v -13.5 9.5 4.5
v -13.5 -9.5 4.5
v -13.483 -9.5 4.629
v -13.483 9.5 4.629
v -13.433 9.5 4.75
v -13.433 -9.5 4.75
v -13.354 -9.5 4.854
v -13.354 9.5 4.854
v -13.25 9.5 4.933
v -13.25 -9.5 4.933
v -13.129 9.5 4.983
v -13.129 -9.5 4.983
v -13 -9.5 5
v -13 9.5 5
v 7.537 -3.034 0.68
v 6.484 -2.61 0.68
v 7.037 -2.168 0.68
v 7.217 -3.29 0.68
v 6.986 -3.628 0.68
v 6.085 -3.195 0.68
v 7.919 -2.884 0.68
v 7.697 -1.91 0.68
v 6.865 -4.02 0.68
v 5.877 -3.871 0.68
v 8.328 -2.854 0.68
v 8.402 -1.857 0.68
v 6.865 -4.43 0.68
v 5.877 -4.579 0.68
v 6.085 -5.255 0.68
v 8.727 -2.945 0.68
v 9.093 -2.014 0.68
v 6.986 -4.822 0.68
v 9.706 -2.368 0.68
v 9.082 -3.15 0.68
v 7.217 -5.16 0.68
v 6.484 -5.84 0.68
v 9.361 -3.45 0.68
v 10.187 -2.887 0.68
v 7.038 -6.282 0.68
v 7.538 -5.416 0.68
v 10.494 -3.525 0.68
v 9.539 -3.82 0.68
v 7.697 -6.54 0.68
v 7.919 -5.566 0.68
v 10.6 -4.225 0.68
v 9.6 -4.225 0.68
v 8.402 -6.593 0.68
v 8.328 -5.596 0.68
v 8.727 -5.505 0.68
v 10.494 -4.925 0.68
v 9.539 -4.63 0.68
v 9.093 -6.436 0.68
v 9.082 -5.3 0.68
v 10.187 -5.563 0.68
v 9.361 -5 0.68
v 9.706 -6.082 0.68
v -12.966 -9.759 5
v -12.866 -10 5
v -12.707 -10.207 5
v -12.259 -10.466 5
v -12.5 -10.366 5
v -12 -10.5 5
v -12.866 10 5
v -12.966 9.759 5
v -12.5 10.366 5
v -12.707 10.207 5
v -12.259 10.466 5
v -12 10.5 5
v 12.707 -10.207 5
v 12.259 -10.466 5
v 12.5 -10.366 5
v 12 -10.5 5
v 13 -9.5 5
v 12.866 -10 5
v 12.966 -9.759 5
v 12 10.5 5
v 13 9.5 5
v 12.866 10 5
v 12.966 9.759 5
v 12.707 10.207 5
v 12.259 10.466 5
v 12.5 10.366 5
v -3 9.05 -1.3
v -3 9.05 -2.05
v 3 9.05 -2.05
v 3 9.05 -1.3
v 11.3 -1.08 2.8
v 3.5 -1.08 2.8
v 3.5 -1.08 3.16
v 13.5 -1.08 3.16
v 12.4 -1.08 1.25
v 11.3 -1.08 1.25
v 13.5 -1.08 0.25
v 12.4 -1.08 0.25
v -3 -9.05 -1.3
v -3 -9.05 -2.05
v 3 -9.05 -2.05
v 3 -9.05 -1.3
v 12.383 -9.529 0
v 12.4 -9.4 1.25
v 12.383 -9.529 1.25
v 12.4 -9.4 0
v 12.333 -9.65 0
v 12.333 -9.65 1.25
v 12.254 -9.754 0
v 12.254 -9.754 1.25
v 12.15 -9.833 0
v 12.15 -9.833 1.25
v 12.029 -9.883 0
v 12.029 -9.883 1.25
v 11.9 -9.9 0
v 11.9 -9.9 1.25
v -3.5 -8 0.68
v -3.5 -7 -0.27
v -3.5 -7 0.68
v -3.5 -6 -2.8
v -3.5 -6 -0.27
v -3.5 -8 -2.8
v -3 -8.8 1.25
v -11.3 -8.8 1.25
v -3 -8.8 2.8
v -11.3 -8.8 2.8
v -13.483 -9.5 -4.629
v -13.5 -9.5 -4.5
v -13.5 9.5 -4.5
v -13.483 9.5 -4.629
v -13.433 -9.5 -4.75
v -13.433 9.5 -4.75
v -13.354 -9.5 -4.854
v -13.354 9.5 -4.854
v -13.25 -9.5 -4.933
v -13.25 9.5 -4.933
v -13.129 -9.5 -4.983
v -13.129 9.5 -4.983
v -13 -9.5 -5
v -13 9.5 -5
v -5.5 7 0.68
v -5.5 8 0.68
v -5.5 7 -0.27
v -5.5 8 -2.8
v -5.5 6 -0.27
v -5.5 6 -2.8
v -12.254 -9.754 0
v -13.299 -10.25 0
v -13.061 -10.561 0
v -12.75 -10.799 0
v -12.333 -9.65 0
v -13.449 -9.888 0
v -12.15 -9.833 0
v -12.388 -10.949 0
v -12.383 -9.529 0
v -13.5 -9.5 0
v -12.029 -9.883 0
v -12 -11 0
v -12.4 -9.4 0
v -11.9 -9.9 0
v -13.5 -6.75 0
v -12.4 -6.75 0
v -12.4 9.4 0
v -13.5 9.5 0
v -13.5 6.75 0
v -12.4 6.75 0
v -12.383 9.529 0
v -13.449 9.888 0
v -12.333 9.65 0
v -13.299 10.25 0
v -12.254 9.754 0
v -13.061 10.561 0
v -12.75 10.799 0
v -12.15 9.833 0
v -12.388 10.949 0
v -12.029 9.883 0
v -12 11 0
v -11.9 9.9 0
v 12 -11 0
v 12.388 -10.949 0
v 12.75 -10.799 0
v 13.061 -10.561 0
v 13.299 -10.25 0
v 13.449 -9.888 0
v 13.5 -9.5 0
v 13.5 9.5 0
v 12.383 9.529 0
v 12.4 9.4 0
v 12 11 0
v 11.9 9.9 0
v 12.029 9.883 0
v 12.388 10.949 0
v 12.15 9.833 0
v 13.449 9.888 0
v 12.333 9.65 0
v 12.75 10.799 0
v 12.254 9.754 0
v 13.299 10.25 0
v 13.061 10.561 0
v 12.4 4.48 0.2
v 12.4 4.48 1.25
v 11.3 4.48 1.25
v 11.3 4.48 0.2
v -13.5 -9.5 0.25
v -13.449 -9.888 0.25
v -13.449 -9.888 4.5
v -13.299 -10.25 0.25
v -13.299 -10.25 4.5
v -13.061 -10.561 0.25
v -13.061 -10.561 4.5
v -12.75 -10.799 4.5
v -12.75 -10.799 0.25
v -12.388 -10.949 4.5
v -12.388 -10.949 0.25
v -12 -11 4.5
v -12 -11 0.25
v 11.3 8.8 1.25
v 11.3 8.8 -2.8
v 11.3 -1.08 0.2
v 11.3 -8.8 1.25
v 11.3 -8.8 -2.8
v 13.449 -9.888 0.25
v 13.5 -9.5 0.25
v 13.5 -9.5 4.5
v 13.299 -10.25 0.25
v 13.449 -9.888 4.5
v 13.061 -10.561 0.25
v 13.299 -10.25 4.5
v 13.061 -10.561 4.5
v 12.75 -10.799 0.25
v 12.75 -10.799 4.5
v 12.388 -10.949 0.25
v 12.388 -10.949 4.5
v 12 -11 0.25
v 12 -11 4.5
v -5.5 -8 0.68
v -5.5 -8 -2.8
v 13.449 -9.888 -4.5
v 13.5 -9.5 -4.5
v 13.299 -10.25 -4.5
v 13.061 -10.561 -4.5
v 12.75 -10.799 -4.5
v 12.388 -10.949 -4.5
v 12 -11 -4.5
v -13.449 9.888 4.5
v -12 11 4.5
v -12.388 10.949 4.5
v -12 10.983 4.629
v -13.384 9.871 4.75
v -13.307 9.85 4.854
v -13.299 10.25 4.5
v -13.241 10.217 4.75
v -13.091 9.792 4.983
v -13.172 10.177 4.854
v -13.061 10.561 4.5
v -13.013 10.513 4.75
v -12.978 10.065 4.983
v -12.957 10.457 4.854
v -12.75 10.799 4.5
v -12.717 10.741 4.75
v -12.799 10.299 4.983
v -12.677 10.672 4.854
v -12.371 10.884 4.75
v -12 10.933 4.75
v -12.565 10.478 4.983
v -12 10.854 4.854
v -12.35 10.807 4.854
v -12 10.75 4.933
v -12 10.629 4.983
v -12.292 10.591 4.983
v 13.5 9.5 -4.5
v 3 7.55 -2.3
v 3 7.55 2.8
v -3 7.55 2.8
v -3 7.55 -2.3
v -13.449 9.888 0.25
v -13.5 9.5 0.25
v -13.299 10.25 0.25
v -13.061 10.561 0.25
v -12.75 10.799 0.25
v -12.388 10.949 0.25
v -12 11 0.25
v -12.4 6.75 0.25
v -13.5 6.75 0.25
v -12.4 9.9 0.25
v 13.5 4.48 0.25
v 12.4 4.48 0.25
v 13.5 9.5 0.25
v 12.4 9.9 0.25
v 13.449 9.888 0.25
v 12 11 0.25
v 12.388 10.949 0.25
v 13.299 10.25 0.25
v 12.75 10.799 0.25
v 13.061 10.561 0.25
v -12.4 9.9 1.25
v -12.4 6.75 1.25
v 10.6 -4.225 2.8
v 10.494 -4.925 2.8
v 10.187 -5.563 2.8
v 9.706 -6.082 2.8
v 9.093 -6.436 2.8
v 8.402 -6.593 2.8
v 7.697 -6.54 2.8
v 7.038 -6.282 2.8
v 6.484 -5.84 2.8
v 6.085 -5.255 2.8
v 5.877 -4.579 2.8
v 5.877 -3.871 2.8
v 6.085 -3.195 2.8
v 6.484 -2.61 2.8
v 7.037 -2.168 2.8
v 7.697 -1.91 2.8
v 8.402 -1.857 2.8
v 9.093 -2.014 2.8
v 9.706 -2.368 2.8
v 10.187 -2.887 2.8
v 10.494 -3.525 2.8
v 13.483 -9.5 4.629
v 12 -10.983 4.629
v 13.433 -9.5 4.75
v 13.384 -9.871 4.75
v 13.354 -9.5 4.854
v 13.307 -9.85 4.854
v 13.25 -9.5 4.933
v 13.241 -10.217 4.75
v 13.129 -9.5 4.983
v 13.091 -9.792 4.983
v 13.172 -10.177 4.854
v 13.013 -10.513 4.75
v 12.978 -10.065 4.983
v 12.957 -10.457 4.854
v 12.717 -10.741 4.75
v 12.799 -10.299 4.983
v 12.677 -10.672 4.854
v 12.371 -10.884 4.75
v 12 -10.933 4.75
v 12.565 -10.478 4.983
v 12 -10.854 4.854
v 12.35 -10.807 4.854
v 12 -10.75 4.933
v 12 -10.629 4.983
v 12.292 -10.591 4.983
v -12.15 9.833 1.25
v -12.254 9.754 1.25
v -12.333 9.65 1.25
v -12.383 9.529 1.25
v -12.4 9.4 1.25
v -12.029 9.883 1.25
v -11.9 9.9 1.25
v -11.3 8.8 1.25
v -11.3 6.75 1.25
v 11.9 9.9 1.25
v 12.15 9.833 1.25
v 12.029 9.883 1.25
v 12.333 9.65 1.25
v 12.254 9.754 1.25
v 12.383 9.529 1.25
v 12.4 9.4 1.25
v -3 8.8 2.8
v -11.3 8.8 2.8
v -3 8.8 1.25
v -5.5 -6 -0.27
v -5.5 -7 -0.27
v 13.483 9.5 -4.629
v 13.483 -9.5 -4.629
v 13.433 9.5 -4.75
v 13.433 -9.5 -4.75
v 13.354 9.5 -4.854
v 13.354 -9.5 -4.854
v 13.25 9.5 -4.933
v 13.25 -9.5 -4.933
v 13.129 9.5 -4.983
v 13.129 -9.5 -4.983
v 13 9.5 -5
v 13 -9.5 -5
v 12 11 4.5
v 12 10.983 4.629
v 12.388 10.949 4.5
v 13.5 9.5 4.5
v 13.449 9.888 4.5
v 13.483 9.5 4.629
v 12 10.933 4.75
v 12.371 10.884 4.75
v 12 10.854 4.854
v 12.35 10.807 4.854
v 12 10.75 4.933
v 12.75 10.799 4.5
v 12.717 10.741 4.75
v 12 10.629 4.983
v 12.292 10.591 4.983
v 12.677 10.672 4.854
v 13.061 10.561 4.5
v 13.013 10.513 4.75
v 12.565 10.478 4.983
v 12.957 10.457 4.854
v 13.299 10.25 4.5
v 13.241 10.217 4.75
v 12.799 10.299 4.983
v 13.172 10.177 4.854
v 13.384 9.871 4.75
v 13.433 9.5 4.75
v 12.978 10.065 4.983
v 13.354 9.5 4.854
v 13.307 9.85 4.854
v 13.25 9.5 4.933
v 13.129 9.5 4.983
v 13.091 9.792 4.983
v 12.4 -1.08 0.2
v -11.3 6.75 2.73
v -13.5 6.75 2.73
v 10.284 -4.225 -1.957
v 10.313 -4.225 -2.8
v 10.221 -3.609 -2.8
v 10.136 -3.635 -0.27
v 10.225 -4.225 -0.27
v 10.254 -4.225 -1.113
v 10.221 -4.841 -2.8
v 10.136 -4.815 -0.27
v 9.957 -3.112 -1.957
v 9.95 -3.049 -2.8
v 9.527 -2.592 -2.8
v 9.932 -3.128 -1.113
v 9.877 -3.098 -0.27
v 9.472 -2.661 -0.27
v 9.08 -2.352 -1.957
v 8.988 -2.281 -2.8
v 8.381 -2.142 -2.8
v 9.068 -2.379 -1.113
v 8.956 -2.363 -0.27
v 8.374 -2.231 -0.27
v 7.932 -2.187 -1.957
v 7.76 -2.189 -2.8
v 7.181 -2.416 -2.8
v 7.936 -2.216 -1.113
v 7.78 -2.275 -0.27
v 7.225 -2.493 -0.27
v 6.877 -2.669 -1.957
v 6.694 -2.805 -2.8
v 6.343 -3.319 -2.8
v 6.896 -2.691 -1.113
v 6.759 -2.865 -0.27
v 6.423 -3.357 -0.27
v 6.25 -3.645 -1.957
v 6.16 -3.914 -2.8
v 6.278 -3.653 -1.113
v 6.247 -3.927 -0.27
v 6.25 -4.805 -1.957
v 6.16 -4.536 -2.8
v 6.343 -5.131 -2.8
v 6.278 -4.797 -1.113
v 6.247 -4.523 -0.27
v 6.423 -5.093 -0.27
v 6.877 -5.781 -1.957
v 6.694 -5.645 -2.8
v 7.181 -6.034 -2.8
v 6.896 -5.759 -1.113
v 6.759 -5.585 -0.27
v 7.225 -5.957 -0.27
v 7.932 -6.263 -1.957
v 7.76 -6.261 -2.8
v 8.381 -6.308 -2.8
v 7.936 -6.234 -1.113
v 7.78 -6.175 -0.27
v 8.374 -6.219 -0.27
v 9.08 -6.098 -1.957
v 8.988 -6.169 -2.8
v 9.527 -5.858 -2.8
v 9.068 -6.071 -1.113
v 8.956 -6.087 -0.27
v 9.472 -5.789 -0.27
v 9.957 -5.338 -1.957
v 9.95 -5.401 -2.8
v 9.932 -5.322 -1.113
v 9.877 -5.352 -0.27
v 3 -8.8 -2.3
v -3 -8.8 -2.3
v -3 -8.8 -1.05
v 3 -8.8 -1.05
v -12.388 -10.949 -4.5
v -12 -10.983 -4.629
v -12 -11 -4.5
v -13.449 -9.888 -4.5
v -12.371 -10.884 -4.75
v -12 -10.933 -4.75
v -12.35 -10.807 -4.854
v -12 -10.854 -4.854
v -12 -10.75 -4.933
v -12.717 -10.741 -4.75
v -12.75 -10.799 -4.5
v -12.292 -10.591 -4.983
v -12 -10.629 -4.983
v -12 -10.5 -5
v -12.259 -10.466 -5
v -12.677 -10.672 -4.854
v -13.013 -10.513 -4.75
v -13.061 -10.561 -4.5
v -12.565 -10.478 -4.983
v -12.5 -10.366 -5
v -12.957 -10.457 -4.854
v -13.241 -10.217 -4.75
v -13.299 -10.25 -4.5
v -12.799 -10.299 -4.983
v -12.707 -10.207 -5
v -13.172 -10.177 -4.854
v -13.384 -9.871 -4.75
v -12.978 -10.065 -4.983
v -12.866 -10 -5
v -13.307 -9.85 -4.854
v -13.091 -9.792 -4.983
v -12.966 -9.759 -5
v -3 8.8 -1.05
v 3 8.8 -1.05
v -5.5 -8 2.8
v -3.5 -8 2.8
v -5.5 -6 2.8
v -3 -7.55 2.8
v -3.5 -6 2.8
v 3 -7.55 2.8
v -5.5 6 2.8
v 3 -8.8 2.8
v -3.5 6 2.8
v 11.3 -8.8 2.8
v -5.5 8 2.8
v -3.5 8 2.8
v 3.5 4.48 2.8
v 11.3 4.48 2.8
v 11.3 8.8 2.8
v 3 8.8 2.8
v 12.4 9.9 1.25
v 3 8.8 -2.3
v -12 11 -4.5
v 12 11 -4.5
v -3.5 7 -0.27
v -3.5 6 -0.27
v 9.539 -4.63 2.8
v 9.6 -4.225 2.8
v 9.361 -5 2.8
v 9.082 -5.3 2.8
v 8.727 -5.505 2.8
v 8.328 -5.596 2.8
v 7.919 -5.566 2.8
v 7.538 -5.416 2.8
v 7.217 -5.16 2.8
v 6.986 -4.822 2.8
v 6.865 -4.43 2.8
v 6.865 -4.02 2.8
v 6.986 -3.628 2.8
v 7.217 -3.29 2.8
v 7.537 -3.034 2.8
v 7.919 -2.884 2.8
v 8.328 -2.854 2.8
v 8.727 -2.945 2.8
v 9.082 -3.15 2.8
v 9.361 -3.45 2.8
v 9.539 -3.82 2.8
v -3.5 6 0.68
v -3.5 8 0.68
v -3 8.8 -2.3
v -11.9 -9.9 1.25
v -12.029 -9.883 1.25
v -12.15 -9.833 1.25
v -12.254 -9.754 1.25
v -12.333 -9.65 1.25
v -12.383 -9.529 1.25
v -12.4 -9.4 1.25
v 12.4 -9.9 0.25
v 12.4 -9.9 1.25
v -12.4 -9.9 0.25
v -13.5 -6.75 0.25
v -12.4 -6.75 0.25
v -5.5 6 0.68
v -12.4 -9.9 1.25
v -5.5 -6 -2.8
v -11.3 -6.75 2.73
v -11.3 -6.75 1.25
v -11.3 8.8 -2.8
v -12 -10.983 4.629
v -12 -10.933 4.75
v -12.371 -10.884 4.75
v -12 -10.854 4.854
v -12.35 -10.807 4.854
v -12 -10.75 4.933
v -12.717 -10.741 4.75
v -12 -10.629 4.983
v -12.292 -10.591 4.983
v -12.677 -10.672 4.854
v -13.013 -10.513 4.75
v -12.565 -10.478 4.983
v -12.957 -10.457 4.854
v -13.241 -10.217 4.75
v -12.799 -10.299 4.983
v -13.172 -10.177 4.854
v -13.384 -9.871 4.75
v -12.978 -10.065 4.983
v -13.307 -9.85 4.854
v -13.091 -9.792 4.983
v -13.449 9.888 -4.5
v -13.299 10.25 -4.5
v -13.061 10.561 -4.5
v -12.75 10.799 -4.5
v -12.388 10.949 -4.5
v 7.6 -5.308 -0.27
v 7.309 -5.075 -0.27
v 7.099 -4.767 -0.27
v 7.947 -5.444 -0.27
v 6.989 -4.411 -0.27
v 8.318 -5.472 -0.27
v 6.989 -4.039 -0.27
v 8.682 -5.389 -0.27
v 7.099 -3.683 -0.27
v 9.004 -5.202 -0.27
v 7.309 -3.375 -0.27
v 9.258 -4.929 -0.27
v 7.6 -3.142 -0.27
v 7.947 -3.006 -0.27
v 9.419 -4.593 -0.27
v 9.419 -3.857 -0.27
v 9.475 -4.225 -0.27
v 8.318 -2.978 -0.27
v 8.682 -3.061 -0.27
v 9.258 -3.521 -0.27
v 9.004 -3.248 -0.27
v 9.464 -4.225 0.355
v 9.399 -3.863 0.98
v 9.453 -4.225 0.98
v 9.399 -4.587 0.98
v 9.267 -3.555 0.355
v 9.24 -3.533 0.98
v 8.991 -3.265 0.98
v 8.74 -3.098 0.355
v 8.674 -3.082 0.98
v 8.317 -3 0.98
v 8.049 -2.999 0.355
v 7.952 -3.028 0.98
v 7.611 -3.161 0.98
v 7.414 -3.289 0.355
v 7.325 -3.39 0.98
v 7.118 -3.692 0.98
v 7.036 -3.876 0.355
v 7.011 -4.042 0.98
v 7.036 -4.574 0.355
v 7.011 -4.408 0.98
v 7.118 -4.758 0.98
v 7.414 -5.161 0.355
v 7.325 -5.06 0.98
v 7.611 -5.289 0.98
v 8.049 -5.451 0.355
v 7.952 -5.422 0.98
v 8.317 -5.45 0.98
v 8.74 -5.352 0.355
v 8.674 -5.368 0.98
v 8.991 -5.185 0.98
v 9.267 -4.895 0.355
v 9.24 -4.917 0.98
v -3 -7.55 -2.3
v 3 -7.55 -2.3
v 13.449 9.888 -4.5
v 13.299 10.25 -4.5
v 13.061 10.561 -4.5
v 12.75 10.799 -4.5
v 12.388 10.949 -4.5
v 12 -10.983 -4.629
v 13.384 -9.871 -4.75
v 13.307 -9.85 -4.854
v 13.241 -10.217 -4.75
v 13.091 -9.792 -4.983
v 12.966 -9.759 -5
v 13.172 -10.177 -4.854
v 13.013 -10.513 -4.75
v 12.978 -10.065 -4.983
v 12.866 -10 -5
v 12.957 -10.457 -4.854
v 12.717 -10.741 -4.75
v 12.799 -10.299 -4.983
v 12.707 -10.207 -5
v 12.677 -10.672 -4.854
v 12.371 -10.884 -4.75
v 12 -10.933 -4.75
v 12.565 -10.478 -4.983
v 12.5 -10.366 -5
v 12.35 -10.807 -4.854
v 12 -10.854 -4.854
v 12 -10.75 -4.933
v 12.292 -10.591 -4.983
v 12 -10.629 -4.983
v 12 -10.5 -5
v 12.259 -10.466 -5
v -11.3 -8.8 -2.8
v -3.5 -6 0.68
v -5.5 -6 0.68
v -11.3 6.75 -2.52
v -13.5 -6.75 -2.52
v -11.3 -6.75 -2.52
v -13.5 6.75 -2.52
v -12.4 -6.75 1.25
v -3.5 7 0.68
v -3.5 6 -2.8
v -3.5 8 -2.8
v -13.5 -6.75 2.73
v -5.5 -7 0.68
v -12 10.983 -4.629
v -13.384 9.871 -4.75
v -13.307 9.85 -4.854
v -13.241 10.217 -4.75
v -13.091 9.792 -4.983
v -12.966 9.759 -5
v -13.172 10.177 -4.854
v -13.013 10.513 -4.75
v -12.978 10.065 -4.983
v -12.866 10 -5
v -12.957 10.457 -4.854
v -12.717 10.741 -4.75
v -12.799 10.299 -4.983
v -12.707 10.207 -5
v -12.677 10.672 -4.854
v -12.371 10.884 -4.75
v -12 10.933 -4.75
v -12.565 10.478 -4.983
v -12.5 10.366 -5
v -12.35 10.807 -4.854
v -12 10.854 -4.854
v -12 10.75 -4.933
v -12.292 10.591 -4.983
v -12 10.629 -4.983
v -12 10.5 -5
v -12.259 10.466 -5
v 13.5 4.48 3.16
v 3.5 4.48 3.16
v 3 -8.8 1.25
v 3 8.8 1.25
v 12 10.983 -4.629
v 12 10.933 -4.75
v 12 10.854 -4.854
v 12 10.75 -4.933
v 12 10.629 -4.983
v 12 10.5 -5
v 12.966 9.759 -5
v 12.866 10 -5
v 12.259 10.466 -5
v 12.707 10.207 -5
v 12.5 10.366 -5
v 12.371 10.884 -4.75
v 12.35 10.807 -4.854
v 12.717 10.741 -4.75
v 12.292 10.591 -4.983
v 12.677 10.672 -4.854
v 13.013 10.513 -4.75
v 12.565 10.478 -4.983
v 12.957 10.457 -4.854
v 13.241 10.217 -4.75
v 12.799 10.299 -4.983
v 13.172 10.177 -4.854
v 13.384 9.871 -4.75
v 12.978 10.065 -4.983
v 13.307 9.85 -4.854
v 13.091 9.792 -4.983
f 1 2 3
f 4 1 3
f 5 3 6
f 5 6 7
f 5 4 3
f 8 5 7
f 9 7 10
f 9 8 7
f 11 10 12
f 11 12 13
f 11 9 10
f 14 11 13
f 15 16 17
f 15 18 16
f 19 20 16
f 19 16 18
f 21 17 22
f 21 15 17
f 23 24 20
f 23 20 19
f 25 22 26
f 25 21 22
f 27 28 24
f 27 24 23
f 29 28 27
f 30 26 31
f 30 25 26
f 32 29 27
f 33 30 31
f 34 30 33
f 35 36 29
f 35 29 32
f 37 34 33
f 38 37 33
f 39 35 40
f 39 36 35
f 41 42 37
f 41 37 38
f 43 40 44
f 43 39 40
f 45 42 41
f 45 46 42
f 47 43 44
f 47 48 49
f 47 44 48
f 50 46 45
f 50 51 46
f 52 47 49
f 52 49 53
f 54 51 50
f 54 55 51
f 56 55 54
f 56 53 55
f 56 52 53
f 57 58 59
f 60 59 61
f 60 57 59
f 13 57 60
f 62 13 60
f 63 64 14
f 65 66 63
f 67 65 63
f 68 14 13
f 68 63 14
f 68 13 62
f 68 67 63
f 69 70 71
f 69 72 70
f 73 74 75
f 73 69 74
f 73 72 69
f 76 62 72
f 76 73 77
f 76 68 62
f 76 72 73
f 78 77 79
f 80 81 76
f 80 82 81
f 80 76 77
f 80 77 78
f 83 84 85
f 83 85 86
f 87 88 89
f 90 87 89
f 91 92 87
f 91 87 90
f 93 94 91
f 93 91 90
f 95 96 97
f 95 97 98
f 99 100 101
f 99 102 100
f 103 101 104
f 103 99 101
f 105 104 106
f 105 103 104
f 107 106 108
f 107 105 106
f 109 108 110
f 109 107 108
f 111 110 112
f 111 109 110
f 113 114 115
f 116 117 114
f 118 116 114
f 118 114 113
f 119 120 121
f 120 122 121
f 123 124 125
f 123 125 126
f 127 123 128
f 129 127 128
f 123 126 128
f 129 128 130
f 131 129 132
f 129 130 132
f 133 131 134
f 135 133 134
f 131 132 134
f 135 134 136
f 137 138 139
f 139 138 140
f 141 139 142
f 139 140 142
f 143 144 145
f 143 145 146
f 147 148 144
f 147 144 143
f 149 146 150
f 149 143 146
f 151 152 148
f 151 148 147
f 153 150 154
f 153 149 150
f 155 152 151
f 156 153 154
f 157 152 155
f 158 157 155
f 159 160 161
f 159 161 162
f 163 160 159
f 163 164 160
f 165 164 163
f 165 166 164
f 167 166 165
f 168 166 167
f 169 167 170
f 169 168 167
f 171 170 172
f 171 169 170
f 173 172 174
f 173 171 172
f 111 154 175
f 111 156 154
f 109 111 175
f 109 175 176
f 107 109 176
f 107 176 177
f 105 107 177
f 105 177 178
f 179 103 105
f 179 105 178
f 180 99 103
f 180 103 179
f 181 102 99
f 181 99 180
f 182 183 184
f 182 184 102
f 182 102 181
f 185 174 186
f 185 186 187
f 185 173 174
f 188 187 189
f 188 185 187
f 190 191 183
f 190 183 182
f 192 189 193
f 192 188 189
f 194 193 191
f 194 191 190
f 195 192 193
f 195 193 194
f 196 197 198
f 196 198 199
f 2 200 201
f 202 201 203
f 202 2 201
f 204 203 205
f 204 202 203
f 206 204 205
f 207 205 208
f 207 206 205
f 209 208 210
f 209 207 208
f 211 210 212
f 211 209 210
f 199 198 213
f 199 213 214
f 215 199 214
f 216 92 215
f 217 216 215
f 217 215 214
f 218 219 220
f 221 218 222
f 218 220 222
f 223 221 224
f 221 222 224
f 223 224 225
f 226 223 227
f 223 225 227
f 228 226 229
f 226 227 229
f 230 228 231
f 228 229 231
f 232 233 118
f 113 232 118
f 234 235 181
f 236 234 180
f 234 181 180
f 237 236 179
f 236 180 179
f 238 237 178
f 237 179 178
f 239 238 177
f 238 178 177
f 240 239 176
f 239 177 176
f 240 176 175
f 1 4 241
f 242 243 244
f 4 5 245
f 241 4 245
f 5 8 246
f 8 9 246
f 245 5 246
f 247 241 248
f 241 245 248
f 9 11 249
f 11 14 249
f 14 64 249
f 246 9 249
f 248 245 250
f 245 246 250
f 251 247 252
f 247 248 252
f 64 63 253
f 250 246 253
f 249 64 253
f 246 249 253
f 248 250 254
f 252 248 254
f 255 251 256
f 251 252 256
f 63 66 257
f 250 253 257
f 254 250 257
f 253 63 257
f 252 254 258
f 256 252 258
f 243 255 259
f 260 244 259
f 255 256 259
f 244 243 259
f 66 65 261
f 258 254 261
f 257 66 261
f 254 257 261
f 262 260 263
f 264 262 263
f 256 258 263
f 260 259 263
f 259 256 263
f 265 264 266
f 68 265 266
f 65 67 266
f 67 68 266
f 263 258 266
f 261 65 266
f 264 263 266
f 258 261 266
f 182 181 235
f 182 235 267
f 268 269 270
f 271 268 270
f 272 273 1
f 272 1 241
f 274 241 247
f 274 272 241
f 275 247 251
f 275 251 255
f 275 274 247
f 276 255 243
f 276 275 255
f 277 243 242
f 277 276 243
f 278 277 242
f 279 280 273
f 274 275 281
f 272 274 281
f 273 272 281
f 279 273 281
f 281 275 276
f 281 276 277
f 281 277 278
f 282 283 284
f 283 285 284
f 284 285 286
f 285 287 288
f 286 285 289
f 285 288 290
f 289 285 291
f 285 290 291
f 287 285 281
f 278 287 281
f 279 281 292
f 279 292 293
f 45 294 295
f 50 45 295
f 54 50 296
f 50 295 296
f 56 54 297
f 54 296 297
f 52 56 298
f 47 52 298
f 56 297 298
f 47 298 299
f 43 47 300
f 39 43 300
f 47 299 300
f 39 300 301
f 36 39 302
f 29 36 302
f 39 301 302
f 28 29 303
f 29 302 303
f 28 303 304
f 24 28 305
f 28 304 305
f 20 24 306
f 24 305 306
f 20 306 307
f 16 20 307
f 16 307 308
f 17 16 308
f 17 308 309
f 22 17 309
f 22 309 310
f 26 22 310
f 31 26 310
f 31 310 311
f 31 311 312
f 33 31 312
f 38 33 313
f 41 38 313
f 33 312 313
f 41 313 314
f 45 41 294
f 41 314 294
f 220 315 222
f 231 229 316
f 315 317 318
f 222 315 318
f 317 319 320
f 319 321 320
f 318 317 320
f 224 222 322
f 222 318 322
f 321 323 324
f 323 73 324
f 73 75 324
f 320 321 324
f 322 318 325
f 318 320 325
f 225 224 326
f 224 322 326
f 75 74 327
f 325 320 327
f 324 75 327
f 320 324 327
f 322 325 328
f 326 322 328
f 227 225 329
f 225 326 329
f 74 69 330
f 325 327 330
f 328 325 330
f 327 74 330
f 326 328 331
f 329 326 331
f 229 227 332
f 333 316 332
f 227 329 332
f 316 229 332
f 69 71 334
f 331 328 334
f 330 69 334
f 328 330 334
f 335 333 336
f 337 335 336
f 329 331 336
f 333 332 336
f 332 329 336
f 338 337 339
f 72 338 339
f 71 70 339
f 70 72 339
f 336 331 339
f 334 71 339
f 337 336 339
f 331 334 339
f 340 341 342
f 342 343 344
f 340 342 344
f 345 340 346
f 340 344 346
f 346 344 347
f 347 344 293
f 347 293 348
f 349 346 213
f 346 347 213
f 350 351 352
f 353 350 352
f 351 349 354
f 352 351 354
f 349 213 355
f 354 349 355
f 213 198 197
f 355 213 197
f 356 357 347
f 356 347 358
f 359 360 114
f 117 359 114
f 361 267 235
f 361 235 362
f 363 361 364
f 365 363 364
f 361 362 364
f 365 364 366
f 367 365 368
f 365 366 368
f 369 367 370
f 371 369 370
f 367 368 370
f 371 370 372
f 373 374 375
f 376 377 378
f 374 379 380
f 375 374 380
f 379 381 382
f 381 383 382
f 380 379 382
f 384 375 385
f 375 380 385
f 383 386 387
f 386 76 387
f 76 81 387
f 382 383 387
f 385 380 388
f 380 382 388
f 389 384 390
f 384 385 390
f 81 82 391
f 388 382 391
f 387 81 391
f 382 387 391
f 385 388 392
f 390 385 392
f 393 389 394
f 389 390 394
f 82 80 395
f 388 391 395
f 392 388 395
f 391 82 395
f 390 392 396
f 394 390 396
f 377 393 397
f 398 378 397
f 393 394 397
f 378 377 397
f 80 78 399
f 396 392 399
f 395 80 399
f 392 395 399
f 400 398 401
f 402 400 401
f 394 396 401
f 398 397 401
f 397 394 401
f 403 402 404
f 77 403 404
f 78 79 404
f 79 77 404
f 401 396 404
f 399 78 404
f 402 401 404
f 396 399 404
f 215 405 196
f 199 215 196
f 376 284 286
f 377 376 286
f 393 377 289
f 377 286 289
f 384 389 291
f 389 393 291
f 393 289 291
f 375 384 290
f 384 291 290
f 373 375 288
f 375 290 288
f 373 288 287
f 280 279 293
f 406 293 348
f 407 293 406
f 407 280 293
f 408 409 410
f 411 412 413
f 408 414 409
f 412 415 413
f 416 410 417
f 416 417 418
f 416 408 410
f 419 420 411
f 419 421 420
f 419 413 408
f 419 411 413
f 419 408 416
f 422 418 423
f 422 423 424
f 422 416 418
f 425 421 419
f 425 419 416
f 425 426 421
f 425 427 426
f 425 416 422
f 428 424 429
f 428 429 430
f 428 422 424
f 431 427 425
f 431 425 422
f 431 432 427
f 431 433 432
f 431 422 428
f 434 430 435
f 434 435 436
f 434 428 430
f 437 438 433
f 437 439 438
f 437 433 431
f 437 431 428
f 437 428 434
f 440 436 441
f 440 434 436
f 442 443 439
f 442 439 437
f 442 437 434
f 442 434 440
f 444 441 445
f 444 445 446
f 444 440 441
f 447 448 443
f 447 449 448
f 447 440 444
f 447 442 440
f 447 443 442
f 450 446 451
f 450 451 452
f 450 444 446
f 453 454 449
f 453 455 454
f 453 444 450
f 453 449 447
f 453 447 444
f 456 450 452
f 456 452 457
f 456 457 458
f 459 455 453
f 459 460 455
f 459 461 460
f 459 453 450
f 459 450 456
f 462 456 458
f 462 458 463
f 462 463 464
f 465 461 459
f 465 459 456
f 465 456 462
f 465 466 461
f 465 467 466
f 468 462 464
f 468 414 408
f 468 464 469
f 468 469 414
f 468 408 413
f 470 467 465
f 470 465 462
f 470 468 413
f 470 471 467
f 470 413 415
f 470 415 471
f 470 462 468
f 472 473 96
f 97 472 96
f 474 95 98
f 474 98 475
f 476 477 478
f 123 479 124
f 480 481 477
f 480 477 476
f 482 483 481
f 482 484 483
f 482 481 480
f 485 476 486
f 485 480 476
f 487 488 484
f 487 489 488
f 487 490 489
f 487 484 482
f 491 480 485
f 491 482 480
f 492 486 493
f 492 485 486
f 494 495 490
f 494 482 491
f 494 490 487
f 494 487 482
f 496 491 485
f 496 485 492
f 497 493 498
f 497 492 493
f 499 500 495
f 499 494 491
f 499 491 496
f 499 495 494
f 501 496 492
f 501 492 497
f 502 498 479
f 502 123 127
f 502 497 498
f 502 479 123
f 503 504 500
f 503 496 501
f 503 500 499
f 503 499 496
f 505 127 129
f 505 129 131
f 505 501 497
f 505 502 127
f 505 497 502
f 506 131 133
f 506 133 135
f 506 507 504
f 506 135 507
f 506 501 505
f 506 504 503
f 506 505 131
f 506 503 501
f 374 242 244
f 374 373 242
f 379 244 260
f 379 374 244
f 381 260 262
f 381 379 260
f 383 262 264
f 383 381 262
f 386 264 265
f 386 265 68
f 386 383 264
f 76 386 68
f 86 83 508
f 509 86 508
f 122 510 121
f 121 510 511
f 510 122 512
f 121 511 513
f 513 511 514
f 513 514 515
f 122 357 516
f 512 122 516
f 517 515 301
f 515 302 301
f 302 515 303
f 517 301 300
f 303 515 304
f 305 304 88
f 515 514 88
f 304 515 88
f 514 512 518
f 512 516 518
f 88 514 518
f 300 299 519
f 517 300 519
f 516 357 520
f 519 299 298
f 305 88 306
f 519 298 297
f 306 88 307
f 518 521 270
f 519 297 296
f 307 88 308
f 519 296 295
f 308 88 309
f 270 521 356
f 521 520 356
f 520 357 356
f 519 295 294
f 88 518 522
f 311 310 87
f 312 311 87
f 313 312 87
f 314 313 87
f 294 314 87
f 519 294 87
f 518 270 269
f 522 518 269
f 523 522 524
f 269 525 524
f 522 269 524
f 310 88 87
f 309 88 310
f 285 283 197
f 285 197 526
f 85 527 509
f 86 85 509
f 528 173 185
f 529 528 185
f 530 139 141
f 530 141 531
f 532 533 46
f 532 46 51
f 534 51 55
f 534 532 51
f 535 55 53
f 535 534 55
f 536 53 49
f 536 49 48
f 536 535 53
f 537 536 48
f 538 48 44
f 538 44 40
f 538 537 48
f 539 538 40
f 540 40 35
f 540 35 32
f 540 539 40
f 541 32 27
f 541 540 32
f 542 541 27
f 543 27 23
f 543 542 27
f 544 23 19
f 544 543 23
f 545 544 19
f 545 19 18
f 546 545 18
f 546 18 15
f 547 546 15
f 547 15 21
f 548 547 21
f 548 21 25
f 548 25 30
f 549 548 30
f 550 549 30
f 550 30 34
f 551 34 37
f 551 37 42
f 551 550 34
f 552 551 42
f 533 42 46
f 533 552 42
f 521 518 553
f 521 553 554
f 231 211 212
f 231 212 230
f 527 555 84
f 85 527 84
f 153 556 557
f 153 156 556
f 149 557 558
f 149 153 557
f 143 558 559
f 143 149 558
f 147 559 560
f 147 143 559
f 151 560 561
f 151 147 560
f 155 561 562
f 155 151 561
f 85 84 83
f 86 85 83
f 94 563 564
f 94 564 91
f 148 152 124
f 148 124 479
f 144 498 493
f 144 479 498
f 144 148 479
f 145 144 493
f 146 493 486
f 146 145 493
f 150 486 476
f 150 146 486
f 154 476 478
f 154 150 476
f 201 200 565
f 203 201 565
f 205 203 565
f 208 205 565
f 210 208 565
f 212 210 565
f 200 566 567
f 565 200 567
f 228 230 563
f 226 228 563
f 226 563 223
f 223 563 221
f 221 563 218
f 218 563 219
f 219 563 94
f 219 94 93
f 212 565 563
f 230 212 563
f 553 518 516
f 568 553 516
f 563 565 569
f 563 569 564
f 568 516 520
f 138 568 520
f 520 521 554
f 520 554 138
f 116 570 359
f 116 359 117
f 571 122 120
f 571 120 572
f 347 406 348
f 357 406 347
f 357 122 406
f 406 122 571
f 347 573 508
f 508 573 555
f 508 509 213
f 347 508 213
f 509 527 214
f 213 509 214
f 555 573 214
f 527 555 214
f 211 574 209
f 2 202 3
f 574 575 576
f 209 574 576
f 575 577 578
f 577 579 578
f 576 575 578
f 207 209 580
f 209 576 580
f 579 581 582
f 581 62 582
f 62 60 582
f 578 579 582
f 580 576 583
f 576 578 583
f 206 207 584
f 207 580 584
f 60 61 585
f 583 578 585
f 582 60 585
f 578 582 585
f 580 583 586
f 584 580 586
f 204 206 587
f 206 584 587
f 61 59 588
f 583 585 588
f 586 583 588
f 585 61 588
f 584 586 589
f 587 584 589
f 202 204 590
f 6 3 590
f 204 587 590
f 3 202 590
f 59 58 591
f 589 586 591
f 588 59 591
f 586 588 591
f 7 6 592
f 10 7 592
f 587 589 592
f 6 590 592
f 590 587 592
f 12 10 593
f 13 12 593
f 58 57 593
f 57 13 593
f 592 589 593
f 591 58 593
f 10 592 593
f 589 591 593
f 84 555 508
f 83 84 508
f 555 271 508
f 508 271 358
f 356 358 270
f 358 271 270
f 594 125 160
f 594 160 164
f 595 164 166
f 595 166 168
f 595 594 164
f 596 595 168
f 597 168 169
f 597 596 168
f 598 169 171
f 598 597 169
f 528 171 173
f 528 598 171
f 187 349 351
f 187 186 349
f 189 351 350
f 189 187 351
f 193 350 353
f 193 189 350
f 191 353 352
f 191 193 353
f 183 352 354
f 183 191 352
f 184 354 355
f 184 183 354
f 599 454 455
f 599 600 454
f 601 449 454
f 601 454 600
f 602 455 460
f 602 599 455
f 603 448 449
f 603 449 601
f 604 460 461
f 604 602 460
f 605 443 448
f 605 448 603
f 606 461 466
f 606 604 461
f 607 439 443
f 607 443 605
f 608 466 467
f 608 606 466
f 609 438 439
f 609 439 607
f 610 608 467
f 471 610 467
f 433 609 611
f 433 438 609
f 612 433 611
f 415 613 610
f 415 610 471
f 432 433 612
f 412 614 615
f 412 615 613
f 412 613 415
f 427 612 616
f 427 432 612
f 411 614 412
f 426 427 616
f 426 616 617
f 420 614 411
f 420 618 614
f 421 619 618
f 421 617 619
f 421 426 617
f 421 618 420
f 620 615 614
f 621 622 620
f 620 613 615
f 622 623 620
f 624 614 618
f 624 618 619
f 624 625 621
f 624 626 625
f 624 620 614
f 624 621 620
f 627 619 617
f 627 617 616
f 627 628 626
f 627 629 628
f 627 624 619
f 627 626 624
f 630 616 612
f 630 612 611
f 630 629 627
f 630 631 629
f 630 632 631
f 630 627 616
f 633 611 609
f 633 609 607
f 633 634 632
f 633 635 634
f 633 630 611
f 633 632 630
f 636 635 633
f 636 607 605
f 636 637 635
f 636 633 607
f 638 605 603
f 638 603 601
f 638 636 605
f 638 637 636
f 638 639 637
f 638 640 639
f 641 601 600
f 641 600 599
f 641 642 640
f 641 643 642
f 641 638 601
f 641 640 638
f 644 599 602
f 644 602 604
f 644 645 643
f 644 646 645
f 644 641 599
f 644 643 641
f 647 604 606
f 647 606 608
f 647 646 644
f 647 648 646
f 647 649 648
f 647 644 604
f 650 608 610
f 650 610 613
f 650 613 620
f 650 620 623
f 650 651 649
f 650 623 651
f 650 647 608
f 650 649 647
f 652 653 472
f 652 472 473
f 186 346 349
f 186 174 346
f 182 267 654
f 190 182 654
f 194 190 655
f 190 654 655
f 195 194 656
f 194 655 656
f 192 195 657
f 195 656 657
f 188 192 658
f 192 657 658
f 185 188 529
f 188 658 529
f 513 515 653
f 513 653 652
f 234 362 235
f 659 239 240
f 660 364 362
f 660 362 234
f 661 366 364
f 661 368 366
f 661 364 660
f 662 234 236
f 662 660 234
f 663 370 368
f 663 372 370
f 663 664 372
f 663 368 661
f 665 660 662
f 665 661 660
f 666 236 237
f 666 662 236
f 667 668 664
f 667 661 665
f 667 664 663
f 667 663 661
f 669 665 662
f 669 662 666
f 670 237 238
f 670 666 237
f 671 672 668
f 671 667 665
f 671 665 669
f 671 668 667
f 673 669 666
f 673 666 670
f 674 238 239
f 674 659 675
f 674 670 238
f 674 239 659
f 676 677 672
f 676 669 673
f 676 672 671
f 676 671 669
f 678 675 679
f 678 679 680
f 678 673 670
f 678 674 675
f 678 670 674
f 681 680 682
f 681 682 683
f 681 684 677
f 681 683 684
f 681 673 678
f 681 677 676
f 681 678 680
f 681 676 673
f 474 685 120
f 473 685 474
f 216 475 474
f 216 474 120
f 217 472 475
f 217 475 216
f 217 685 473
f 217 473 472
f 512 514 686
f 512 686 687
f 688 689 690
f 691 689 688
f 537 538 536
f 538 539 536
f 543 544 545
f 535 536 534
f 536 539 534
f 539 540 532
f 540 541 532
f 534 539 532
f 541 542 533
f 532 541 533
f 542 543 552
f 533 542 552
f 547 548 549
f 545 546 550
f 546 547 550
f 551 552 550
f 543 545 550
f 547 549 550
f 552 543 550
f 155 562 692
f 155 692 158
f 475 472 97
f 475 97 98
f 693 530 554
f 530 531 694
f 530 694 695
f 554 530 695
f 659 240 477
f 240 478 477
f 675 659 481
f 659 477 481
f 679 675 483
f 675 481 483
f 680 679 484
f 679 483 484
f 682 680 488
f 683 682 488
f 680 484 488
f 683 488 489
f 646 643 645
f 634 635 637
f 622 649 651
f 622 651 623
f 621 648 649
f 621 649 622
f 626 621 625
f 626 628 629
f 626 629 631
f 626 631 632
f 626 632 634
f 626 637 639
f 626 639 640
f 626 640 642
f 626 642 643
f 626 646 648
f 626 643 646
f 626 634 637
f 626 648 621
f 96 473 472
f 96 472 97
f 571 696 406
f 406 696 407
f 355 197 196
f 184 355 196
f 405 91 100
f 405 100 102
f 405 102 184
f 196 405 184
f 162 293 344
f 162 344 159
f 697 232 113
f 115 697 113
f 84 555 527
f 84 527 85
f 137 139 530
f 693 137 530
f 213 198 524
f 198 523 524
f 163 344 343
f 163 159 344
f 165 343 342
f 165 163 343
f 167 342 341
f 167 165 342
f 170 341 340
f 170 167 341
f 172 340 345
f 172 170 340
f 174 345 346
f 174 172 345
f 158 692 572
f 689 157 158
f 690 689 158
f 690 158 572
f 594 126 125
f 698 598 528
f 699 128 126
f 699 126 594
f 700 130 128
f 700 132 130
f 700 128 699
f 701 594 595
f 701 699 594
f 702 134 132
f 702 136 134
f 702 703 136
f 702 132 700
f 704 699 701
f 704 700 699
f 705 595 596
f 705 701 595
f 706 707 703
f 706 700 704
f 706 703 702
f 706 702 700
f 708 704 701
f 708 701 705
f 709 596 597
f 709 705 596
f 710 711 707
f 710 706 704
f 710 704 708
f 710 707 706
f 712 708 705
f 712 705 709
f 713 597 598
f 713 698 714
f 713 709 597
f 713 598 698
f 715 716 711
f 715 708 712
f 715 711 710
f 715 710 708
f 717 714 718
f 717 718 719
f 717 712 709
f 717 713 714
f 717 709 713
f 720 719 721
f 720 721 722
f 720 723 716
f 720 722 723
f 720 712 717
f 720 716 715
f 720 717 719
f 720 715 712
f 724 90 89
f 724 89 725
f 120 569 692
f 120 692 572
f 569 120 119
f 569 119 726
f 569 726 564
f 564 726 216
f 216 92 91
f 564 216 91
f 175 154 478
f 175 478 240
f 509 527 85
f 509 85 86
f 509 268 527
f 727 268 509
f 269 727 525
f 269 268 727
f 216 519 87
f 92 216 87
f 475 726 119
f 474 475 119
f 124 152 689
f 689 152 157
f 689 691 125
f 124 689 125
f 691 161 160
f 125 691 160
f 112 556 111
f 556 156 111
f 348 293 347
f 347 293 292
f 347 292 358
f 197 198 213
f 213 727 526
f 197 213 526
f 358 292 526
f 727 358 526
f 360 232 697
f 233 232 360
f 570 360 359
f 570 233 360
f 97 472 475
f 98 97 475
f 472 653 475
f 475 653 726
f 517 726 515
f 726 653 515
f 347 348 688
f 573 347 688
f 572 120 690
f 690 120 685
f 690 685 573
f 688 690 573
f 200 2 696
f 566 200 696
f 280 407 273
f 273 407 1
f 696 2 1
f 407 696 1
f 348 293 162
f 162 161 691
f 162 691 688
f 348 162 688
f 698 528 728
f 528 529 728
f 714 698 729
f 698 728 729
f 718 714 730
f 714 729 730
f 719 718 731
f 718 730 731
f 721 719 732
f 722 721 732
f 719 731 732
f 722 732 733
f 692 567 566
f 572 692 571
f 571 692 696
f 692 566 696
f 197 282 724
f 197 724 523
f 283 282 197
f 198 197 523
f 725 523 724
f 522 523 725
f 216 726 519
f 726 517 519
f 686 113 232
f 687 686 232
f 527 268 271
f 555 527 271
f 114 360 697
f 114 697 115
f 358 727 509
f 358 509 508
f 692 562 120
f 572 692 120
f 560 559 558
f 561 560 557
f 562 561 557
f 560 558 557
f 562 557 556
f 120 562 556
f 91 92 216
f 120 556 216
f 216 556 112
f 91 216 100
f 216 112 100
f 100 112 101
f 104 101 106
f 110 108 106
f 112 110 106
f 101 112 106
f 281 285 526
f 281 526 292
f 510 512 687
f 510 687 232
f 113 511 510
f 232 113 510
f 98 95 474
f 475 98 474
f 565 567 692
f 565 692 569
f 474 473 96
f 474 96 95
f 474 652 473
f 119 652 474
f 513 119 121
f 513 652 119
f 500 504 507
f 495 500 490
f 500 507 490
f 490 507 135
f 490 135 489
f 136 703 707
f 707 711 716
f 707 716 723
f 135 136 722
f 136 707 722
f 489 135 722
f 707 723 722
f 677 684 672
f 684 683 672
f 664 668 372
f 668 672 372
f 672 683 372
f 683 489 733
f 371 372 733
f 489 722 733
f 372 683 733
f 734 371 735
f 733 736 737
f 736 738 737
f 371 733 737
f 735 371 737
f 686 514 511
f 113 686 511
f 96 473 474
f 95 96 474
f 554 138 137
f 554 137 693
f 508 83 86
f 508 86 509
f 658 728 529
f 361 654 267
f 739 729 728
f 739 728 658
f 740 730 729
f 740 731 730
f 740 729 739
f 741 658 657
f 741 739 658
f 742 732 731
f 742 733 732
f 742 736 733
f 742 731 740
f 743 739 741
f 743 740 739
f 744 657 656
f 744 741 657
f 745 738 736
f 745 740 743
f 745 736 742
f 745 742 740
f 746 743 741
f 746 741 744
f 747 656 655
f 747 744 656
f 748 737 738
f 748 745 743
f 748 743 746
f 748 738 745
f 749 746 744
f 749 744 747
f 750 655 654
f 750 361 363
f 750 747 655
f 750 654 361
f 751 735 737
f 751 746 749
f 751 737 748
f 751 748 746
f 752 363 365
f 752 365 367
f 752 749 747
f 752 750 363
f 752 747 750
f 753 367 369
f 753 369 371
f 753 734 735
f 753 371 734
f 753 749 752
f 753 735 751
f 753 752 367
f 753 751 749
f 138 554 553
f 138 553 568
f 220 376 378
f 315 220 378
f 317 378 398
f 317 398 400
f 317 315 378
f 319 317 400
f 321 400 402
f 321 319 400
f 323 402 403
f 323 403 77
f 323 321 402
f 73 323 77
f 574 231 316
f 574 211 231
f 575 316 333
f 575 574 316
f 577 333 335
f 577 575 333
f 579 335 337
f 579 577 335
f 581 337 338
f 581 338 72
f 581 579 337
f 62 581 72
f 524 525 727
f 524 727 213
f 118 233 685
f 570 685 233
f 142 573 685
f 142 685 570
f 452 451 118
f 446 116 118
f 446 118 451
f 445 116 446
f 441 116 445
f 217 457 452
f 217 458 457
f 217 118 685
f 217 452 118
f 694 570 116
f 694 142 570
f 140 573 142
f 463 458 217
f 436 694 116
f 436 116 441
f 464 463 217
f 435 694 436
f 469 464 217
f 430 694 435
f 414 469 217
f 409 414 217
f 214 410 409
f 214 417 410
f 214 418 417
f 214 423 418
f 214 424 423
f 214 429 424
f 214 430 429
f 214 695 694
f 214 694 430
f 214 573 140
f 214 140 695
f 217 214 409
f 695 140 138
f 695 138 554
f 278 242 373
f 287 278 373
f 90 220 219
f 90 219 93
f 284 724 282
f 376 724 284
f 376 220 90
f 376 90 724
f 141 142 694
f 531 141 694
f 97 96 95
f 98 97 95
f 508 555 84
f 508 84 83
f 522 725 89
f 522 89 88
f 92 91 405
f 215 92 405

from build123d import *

# Parameters (mm, degrees)
SKETCH1_W                   = 27
SKETCH1_H                   = 22
BOSS_EXTRUDE1_DEPTH         = 5
FILLET1_R                   = 1.5
SHELL1_T                    = 2.2
SKETCH4_W                   = 5.25
SKETCH4_H                   = 13.5
CUT_EXTRUDE1_DEPTH          = 10
SKETCH3_W                   = 2.96
SKETCH3_H                   = 5.56
CUT_EXTRUDE2_DEPTH          = 10
FILLET2_R                   = 0.5
FILLET3_R                   = 0.5
SKETCH5_W                   = 2
SKETCH5_H                   = 1
BOSS_EXTRUDE2_DEPTH         = 2.53
SKETCH5_3_W                 = 2
SKETCH5_3_H                 = 1
BOSS_EXTRUDE3_DEPTH         = 3.48
SKETCH6_W                   = 2
SKETCH6_H                   = 2
BOSS_EXTRUDE4_DEPTH         = 2.12
LIP_GROOVE2_GROOVE_DEPTH    = 1.25
LIP_GROOVE2_GROOVE_2_DEPTH  = 0.25
LIP_GROOVE2_LIP_START       = -9.9
LIP_GROOVE2_LIP_OUTLINE_W   = 24.8
LIP_GROOVE2_LIP_OUTLINE_H   = 1.25
LIP_GROOVE2_LIP_DEPTH       = 1.1
LIP_GROOVE2_LIP_START_2     = 8.8
LIP_GROOVE2_LIP_2_OUTLINE_W = 24.8
LIP_GROOVE2_LIP_2_OUTLINE_H = 1.25
LIP_GROOVE2_LIP_2_DEPTH     = 1.1
LIP_GROOVE2_LIP_START_3     = -8.8
LIP_GROOVE2_LIP_3_OUTLINE_W = 1.1
LIP_GROOVE2_LIP_3_OUTLINE_H = 1.25
LIP_GROOVE2_LIP_3_DEPTH     = 17.6
LIP_GROOVE2_LIP_4_OUTLINE_W = 1.1
LIP_GROOVE2_LIP_4_OUTLINE_H = 1.25
LIP_GROOVE2_LIP_4_DEPTH     = 2.05
LIP_GROOVE2_LIP_START_4     = 6.75
LIP_GROOVE2_LIP_5_OUTLINE_W = 1.1
LIP_GROOVE2_LIP_5_OUTLINE_H = 1.25
LIP_GROOVE2_LIP_5_DEPTH     = 2.05
SKETCH11_W                  = 6
SKETCH11_H                  = 1.25
BOSS_EXTRUDE5_DEPTH         = 5.1
BOSS_EXTRUDE6_DEPTH         = 6
CUT_EXTRUDE3_DEPTH          = 6
FILLET4_R                   = 0.5
SKETCH3_3_W                 = 2.96
SKETCH3_3_H                 = 5.56
CUT_EXTRUDE4_DEPTH          = 10
SKETCH14_R                  = 2.375
SKETCH14_R_2                = 1.375
BOSS_EXTRUDE7_DEPTH         = 2.12


with BuildPart() as part:
    # Sketch1 → Boss-Extrude1 (new, symmetric)
    with BuildSketch(Plane.XY):
        Rectangle(SKETCH1_W, SKETCH1_H)
    extrude(amount=BOSS_EXTRUDE1_DEPTH, both=True)

    # Fillet1
    fillet1_edges = [part.edges().sort_by_distance(p)[0] for p in [
        (-13.5, 11, 0),
        (13.5, 11, 0),
        (13.5, -11, 0),
        (-13.5, -11, 0),
    ]]
    fillet(fillet1_edges, radius=FILLET1_R)

    # Shell1 (no face opened: a closed hollow body)
    add(offset(amount=-SHELL1_T, mode=Mode.PRIVATE), mode=Mode.SUBTRACT)


with BuildPart() as body_2:
    # Split1: the piece on the far side of the plane
    add(part.part)
    split(bisect_by=Plane.XY, keep=Keep.BOTTOM)

    # Mounting Boss1: read off the stored shape, not the designer's step
    # Mounting Boss1 outline → Mounting Boss1 (revolve)
    with BuildSketch(Plane(origin=(8.225, -4.225, 0), x_dir=(1, 0, 0), z_dir=(0, -1, 0))):
        Polygon((2, -0.27), (1.25, -0.27), (1.228181169, 0.98), (0, 0.98), (0, -2.8), (2.088349547, -2.8), align=None)
    revolve(axis=Axis((8.225, -4.225, 0), (0, 0, 1)))


with BuildPart() as part_1:
    add(part.part)

    # Split1
    split(bisect_by=Plane.XY, keep=Keep.TOP)


with BuildPart() as cut_extrude1_tool:
    # Sketch4 → Cut-Extrude1 (new body)
    with BuildSketch(Plane.ZY.offset(13.5)):
        with Locations((0.105, 0)):
            Rectangle(SKETCH4_W, SKETCH4_H)
    extrude(amount=-CUT_EXTRUDE1_DEPTH)


with BuildPart() as part_2:
    add(part_1.part)

    # Cut-Extrude1: cut by cut_extrude1_tool
    add(cut_extrude1_tool.part, mode=Mode.SUBTRACT)

    # Sketch3 → Cut-Extrude2 (cut)
    with BuildSketch(Plane(origin=(13.5, 0, 0), x_dir=(0, 0, -1), z_dir=(1, 0, 0))):
        with Locations((-1.68, 1.7)):
            Rectangle(SKETCH3_W, SKETCH3_H)
    extrude(amount=-CUT_EXTRUDE2_DEPTH, mode=Mode.SUBTRACT)

    # Fillet2
    fillet2_edges = [part_2.edges().sort_by_distance(p)[0] for p in [
        (-13.5, 0, 5),
        (0, 11, 5),
        (0, -11, 5),
        (13.5, 0, 5),
        (-13.060660172, -10.560660172, 5),
        (13.060660172, -10.560660172, 5),
        (13.060660172, 10.560660172, 5),
        (-13.060660172, 10.560660172, 5),
    ]]
    fillet(fillet2_edges, radius=FILLET2_R)

    # Sketch6 → Boss-Extrude4 (add)
    with BuildSketch(Plane(origin=(0, 0, 2.8), x_dir=(-1, 0, 0), z_dir=(0, 0, -1))):
        with Locations((4.5, 7)):
            Rectangle(SKETCH6_W, SKETCH6_H)
    boss_extrude4 = extrude(amount=BOSS_EXTRUDE4_DEPTH)

    # Mirror3: Boss-Extrude4 across plane
    add(boss_extrude4.mirror(Plane.ZX))

    # Lip&Groove2-Groove: read off the stored shape, not the designer's step
    # Lip&Groove2-Groove outline → Lip&Groove2-Groove (cut)
    with BuildSketch(Plane.XY):
        Polygon((-12.4, -9.9), (12.4, -9.9), (12.4, -1.08), (13.5, -1.08), (13.5, 4.48), (12.4, 4.48), (12.4, 9.9), (-12.4, 9.9), (-12.4, 6.75), (-11.3, 6.75), (-11.3, 8.8), (11.3, 8.8), (11.3, -8.8), (-11.3, -8.8), (-11.3, -6.75), (-12.4, -6.75), align=None)
    extrude(amount=LIP_GROOVE2_GROOVE_DEPTH, mode=Mode.SUBTRACT)

    # Lip_Groove2-Groove 2 outline → Lip_Groove2-Groove 2 (cut)
    with BuildSketch(Plane.XY):
        with BuildLine():
            Line((12.4, -1.08), (12.4, -9.9))
            Line((12.4, -9.9), (-12.4, -9.9))
            Line((-12.4, -9.9), (-12.4, -6.75))
            Line((-12.4, -6.75), (-13.5, -6.75))
            Line((-13.5, -6.75), (-13.5, -9.5))
            ThreePointArc((-13.5, -9.5), (-13.060660172, -10.560660172), (-12, -11))
            Line((-12, -11), (12, -11))
            ThreePointArc((12, -11), (13.060660172, -10.560660172), (13.5, -9.5))
            Line((13.5, -9.5), (13.5, -1.08))
            Line((13.5, -1.08), (12.4, -1.08))
        make_face()
        with BuildLine():
            Line((12.4, 4.48), (13.5, 4.48))
            Line((13.5, 4.48), (13.5, 9.5))
            ThreePointArc((13.5, 9.5), (13.060660172, 10.560660172), (12, 11))
            Line((12, 11), (-12, 11))
            ThreePointArc((-12, 11), (-13.060660172, 10.560660172), (-13.5, 9.5))
            Line((-13.5, 9.5), (-13.5, 6.75))
            Line((-13.5, 6.75), (-12.4, 6.75))
            Line((-12.4, 6.75), (-12.4, 9.9))
            Line((-12.4, 9.9), (12.4, 9.9))
            Line((12.4, 9.9), (12.4, 4.48))
        make_face()
    extrude(amount=LIP_GROOVE2_GROOVE_2_DEPTH, mode=Mode.SUBTRACT)

    # Sketch11 → Boss-Extrude5 (add)
    with BuildSketch(Plane(origin=(0, 0, 2.8), x_dir=(-1, 0, 0), z_dir=(0, 0, -1))):
        with Locations((0, -8.175)):
            Rectangle(SKETCH11_W, SKETCH11_H)
    boss_extrude5 = extrude(amount=BOSS_EXTRUDE5_DEPTH)

    # Sketch12 → Boss-Extrude6 (add)
    with BuildSketch(Plane.ZY.offset(3)):
        Polygon((-2.3, -8.8), (-2.05, -9.05), (-1.3, -9.05), (-1.05, -8.8), align=None)
    boss_extrude6 = extrude(amount=-BOSS_EXTRUDE6_DEPTH)

    # Mirror5: Boss-Extrude5, Boss-Extrude6 across plane
    add(boss_extrude5.mirror(Plane.ZX))
    add(boss_extrude6.mirror(Plane.ZX))

    # Sketch14 → Boss-Extrude7 (add)
    with BuildSketch(Plane(origin=(0, 0, 2.8), x_dir=(-1, 0, 0), z_dir=(0, 0, -1))):
        with Locations(Location((-8.225, -4.225, 0), (0, 0, 180))):
            Circle(SKETCH14_R)
        with Locations(Location((-8.225, -4.225, 0), (0, 0, 180))):
            Circle(SKETCH14_R_2, mode=Mode.SUBTRACT)
    extrude(amount=BOSS_EXTRUDE7_DEPTH)


with BuildPart() as body_2_1:
    add(body_2.part)

    # Cut-Extrude1: cut by cut_extrude1_tool
    add(cut_extrude1_tool.part, mode=Mode.SUBTRACT)

    # Fillet3
    fillet3_edges = [body_2_1.edges().sort_by_distance(p)[0] for p in [
        (-13.5, 0, -5),
        (0, -11, -5),
        (13.5, 0, -5),
        (0, 11, -5),
        (-13.060660172, -10.560660172, -5),
        (13.060660172, -10.560660172, -5),
        (13.060660172, 10.560660172, -5),
        (-13.060660172, 10.560660172, -5),
    ]]
    fillet(fillet3_edges, radius=FILLET3_R)

    # Sketch5 → Boss-Extrude2 (add)
    with BuildSketch(Plane.XY.offset(-2.8)):
        with Locations((-4.5, 7.5)):
            Rectangle(SKETCH5_W, SKETCH5_H)
        with Locations((-4.5, 6.5)):
            Rectangle(SKETCH5_W, SKETCH5_H)
    boss_extrude2 = extrude(amount=BOSS_EXTRUDE2_DEPTH)

    # Sketch5<3> → Boss-Extrude3 (add)
    with BuildSketch(Plane.XY.offset(-2.8)):
        with Locations((-4.5, 7.5)):
            Rectangle(SKETCH5_3_W, SKETCH5_3_H)
    boss_extrude3 = extrude(amount=BOSS_EXTRUDE3_DEPTH)

    # Mirror2: Boss-Extrude2, Boss-Extrude3 across plane
    add(boss_extrude2.mirror(Plane.ZX))
    add(boss_extrude3.mirror(Plane.ZX))

    # Lip&Groove2-Lip: read off the stored shape, not the designer's step
    # Lip&Groove2-Lip outline → Lip&Groove2-Lip (add)
    with BuildSketch(Plane(origin=(0, 0, 0), x_dir=(1, 0, 0), z_dir=(0, 1, 0)).offset(LIP_GROOVE2_LIP_START)):
        with Locations((0, -0.625)):
            Rectangle(LIP_GROOVE2_LIP_OUTLINE_W, LIP_GROOVE2_LIP_OUTLINE_H)
    extrude(amount=LIP_GROOVE2_LIP_DEPTH)

    # Lip_Groove2-Lip 2 outline → Lip_Groove2-Lip 2 (add)
    with BuildSketch(Plane(origin=(0, 0, 0), x_dir=(1, 0, 0), z_dir=(0, 1, 0)).offset(LIP_GROOVE2_LIP_START_2)):
        with Locations((0, -0.625)):
            Rectangle(LIP_GROOVE2_LIP_2_OUTLINE_W, LIP_GROOVE2_LIP_2_OUTLINE_H)
    extrude(amount=LIP_GROOVE2_LIP_2_DEPTH)

    # Lip_Groove2-Lip 3 outline → Lip_Groove2-Lip 3 (add)
    with BuildSketch(Plane(origin=(0, 0, 0), x_dir=(1, 0, 0), z_dir=(0, 1, 0)).offset(LIP_GROOVE2_LIP_START_3)):
        with Locations((11.85, -0.625)):
            Rectangle(LIP_GROOVE2_LIP_3_OUTLINE_W, LIP_GROOVE2_LIP_3_OUTLINE_H)
    extrude(amount=LIP_GROOVE2_LIP_3_DEPTH)

    # Lip_Groove2-Lip 4 outline → Lip_Groove2-Lip 4 (add)
    with BuildSketch(Plane(origin=(0, 0, 0), x_dir=(1, 0, 0), z_dir=(0, 1, 0)).offset(LIP_GROOVE2_LIP_START_3)):
        with Locations((-11.85, -0.625)):
            Rectangle(LIP_GROOVE2_LIP_4_OUTLINE_W, LIP_GROOVE2_LIP_4_OUTLINE_H)
    extrude(amount=LIP_GROOVE2_LIP_4_DEPTH)

    # Lip_Groove2-Lip 5 outline → Lip_Groove2-Lip 5 (add)
    with BuildSketch(Plane(origin=(0, 0, 0), x_dir=(1, 0, 0), z_dir=(0, 1, 0)).offset(LIP_GROOVE2_LIP_START_4)):
        with Locations((-11.85, -0.625)):
            Rectangle(LIP_GROOVE2_LIP_5_OUTLINE_W, LIP_GROOVE2_LIP_5_OUTLINE_H)
    extrude(amount=LIP_GROOVE2_LIP_5_DEPTH)

    # Sketch12<2> → Cut-Extrude3 (cut)
    with BuildSketch(Plane.ZY.offset(3)):
        Polygon((-2.3, -8.8), (-2.05, -9.05), (-1.3, -9.05), (-1.05, -8.8), align=None)
    cut_extrude3 = extrude(amount=-CUT_EXTRUDE3_DEPTH, mode=Mode.SUBTRACT)

    # Mirror6: Cut-Extrude3 across plane
    add(cut_extrude3.mirror(Plane.ZX), mode=Mode.SUBTRACT)

    # Fillet4
    fillet4_edges = [body_2_1.edges().sort_by_distance(p)[0] for p in [
        (-12.4, -9.9, 0.625),
        (12.4, -9.9, 0.625),
        (12.4, 9.9, 0.625),
        (-12.4, 9.9, 0.625),
    ]]
    fillet(fillet4_edges, radius=FILLET4_R)

    # Sketch3<3> → Cut-Extrude4 (cut)
    with BuildSketch(Plane(origin=(13.5, 0, 0), x_dir=(0, 0, -1), z_dir=(1, 0, 0))):
        with Locations((-1.68, 1.7)):
            Rectangle(SKETCH3_3_W, SKETCH3_3_H)
    extrude(amount=-CUT_EXTRUDE4_DEPTH, mode=Mode.SUBTRACT)


solid = Compound([part_2.part, body_2_1.part])
